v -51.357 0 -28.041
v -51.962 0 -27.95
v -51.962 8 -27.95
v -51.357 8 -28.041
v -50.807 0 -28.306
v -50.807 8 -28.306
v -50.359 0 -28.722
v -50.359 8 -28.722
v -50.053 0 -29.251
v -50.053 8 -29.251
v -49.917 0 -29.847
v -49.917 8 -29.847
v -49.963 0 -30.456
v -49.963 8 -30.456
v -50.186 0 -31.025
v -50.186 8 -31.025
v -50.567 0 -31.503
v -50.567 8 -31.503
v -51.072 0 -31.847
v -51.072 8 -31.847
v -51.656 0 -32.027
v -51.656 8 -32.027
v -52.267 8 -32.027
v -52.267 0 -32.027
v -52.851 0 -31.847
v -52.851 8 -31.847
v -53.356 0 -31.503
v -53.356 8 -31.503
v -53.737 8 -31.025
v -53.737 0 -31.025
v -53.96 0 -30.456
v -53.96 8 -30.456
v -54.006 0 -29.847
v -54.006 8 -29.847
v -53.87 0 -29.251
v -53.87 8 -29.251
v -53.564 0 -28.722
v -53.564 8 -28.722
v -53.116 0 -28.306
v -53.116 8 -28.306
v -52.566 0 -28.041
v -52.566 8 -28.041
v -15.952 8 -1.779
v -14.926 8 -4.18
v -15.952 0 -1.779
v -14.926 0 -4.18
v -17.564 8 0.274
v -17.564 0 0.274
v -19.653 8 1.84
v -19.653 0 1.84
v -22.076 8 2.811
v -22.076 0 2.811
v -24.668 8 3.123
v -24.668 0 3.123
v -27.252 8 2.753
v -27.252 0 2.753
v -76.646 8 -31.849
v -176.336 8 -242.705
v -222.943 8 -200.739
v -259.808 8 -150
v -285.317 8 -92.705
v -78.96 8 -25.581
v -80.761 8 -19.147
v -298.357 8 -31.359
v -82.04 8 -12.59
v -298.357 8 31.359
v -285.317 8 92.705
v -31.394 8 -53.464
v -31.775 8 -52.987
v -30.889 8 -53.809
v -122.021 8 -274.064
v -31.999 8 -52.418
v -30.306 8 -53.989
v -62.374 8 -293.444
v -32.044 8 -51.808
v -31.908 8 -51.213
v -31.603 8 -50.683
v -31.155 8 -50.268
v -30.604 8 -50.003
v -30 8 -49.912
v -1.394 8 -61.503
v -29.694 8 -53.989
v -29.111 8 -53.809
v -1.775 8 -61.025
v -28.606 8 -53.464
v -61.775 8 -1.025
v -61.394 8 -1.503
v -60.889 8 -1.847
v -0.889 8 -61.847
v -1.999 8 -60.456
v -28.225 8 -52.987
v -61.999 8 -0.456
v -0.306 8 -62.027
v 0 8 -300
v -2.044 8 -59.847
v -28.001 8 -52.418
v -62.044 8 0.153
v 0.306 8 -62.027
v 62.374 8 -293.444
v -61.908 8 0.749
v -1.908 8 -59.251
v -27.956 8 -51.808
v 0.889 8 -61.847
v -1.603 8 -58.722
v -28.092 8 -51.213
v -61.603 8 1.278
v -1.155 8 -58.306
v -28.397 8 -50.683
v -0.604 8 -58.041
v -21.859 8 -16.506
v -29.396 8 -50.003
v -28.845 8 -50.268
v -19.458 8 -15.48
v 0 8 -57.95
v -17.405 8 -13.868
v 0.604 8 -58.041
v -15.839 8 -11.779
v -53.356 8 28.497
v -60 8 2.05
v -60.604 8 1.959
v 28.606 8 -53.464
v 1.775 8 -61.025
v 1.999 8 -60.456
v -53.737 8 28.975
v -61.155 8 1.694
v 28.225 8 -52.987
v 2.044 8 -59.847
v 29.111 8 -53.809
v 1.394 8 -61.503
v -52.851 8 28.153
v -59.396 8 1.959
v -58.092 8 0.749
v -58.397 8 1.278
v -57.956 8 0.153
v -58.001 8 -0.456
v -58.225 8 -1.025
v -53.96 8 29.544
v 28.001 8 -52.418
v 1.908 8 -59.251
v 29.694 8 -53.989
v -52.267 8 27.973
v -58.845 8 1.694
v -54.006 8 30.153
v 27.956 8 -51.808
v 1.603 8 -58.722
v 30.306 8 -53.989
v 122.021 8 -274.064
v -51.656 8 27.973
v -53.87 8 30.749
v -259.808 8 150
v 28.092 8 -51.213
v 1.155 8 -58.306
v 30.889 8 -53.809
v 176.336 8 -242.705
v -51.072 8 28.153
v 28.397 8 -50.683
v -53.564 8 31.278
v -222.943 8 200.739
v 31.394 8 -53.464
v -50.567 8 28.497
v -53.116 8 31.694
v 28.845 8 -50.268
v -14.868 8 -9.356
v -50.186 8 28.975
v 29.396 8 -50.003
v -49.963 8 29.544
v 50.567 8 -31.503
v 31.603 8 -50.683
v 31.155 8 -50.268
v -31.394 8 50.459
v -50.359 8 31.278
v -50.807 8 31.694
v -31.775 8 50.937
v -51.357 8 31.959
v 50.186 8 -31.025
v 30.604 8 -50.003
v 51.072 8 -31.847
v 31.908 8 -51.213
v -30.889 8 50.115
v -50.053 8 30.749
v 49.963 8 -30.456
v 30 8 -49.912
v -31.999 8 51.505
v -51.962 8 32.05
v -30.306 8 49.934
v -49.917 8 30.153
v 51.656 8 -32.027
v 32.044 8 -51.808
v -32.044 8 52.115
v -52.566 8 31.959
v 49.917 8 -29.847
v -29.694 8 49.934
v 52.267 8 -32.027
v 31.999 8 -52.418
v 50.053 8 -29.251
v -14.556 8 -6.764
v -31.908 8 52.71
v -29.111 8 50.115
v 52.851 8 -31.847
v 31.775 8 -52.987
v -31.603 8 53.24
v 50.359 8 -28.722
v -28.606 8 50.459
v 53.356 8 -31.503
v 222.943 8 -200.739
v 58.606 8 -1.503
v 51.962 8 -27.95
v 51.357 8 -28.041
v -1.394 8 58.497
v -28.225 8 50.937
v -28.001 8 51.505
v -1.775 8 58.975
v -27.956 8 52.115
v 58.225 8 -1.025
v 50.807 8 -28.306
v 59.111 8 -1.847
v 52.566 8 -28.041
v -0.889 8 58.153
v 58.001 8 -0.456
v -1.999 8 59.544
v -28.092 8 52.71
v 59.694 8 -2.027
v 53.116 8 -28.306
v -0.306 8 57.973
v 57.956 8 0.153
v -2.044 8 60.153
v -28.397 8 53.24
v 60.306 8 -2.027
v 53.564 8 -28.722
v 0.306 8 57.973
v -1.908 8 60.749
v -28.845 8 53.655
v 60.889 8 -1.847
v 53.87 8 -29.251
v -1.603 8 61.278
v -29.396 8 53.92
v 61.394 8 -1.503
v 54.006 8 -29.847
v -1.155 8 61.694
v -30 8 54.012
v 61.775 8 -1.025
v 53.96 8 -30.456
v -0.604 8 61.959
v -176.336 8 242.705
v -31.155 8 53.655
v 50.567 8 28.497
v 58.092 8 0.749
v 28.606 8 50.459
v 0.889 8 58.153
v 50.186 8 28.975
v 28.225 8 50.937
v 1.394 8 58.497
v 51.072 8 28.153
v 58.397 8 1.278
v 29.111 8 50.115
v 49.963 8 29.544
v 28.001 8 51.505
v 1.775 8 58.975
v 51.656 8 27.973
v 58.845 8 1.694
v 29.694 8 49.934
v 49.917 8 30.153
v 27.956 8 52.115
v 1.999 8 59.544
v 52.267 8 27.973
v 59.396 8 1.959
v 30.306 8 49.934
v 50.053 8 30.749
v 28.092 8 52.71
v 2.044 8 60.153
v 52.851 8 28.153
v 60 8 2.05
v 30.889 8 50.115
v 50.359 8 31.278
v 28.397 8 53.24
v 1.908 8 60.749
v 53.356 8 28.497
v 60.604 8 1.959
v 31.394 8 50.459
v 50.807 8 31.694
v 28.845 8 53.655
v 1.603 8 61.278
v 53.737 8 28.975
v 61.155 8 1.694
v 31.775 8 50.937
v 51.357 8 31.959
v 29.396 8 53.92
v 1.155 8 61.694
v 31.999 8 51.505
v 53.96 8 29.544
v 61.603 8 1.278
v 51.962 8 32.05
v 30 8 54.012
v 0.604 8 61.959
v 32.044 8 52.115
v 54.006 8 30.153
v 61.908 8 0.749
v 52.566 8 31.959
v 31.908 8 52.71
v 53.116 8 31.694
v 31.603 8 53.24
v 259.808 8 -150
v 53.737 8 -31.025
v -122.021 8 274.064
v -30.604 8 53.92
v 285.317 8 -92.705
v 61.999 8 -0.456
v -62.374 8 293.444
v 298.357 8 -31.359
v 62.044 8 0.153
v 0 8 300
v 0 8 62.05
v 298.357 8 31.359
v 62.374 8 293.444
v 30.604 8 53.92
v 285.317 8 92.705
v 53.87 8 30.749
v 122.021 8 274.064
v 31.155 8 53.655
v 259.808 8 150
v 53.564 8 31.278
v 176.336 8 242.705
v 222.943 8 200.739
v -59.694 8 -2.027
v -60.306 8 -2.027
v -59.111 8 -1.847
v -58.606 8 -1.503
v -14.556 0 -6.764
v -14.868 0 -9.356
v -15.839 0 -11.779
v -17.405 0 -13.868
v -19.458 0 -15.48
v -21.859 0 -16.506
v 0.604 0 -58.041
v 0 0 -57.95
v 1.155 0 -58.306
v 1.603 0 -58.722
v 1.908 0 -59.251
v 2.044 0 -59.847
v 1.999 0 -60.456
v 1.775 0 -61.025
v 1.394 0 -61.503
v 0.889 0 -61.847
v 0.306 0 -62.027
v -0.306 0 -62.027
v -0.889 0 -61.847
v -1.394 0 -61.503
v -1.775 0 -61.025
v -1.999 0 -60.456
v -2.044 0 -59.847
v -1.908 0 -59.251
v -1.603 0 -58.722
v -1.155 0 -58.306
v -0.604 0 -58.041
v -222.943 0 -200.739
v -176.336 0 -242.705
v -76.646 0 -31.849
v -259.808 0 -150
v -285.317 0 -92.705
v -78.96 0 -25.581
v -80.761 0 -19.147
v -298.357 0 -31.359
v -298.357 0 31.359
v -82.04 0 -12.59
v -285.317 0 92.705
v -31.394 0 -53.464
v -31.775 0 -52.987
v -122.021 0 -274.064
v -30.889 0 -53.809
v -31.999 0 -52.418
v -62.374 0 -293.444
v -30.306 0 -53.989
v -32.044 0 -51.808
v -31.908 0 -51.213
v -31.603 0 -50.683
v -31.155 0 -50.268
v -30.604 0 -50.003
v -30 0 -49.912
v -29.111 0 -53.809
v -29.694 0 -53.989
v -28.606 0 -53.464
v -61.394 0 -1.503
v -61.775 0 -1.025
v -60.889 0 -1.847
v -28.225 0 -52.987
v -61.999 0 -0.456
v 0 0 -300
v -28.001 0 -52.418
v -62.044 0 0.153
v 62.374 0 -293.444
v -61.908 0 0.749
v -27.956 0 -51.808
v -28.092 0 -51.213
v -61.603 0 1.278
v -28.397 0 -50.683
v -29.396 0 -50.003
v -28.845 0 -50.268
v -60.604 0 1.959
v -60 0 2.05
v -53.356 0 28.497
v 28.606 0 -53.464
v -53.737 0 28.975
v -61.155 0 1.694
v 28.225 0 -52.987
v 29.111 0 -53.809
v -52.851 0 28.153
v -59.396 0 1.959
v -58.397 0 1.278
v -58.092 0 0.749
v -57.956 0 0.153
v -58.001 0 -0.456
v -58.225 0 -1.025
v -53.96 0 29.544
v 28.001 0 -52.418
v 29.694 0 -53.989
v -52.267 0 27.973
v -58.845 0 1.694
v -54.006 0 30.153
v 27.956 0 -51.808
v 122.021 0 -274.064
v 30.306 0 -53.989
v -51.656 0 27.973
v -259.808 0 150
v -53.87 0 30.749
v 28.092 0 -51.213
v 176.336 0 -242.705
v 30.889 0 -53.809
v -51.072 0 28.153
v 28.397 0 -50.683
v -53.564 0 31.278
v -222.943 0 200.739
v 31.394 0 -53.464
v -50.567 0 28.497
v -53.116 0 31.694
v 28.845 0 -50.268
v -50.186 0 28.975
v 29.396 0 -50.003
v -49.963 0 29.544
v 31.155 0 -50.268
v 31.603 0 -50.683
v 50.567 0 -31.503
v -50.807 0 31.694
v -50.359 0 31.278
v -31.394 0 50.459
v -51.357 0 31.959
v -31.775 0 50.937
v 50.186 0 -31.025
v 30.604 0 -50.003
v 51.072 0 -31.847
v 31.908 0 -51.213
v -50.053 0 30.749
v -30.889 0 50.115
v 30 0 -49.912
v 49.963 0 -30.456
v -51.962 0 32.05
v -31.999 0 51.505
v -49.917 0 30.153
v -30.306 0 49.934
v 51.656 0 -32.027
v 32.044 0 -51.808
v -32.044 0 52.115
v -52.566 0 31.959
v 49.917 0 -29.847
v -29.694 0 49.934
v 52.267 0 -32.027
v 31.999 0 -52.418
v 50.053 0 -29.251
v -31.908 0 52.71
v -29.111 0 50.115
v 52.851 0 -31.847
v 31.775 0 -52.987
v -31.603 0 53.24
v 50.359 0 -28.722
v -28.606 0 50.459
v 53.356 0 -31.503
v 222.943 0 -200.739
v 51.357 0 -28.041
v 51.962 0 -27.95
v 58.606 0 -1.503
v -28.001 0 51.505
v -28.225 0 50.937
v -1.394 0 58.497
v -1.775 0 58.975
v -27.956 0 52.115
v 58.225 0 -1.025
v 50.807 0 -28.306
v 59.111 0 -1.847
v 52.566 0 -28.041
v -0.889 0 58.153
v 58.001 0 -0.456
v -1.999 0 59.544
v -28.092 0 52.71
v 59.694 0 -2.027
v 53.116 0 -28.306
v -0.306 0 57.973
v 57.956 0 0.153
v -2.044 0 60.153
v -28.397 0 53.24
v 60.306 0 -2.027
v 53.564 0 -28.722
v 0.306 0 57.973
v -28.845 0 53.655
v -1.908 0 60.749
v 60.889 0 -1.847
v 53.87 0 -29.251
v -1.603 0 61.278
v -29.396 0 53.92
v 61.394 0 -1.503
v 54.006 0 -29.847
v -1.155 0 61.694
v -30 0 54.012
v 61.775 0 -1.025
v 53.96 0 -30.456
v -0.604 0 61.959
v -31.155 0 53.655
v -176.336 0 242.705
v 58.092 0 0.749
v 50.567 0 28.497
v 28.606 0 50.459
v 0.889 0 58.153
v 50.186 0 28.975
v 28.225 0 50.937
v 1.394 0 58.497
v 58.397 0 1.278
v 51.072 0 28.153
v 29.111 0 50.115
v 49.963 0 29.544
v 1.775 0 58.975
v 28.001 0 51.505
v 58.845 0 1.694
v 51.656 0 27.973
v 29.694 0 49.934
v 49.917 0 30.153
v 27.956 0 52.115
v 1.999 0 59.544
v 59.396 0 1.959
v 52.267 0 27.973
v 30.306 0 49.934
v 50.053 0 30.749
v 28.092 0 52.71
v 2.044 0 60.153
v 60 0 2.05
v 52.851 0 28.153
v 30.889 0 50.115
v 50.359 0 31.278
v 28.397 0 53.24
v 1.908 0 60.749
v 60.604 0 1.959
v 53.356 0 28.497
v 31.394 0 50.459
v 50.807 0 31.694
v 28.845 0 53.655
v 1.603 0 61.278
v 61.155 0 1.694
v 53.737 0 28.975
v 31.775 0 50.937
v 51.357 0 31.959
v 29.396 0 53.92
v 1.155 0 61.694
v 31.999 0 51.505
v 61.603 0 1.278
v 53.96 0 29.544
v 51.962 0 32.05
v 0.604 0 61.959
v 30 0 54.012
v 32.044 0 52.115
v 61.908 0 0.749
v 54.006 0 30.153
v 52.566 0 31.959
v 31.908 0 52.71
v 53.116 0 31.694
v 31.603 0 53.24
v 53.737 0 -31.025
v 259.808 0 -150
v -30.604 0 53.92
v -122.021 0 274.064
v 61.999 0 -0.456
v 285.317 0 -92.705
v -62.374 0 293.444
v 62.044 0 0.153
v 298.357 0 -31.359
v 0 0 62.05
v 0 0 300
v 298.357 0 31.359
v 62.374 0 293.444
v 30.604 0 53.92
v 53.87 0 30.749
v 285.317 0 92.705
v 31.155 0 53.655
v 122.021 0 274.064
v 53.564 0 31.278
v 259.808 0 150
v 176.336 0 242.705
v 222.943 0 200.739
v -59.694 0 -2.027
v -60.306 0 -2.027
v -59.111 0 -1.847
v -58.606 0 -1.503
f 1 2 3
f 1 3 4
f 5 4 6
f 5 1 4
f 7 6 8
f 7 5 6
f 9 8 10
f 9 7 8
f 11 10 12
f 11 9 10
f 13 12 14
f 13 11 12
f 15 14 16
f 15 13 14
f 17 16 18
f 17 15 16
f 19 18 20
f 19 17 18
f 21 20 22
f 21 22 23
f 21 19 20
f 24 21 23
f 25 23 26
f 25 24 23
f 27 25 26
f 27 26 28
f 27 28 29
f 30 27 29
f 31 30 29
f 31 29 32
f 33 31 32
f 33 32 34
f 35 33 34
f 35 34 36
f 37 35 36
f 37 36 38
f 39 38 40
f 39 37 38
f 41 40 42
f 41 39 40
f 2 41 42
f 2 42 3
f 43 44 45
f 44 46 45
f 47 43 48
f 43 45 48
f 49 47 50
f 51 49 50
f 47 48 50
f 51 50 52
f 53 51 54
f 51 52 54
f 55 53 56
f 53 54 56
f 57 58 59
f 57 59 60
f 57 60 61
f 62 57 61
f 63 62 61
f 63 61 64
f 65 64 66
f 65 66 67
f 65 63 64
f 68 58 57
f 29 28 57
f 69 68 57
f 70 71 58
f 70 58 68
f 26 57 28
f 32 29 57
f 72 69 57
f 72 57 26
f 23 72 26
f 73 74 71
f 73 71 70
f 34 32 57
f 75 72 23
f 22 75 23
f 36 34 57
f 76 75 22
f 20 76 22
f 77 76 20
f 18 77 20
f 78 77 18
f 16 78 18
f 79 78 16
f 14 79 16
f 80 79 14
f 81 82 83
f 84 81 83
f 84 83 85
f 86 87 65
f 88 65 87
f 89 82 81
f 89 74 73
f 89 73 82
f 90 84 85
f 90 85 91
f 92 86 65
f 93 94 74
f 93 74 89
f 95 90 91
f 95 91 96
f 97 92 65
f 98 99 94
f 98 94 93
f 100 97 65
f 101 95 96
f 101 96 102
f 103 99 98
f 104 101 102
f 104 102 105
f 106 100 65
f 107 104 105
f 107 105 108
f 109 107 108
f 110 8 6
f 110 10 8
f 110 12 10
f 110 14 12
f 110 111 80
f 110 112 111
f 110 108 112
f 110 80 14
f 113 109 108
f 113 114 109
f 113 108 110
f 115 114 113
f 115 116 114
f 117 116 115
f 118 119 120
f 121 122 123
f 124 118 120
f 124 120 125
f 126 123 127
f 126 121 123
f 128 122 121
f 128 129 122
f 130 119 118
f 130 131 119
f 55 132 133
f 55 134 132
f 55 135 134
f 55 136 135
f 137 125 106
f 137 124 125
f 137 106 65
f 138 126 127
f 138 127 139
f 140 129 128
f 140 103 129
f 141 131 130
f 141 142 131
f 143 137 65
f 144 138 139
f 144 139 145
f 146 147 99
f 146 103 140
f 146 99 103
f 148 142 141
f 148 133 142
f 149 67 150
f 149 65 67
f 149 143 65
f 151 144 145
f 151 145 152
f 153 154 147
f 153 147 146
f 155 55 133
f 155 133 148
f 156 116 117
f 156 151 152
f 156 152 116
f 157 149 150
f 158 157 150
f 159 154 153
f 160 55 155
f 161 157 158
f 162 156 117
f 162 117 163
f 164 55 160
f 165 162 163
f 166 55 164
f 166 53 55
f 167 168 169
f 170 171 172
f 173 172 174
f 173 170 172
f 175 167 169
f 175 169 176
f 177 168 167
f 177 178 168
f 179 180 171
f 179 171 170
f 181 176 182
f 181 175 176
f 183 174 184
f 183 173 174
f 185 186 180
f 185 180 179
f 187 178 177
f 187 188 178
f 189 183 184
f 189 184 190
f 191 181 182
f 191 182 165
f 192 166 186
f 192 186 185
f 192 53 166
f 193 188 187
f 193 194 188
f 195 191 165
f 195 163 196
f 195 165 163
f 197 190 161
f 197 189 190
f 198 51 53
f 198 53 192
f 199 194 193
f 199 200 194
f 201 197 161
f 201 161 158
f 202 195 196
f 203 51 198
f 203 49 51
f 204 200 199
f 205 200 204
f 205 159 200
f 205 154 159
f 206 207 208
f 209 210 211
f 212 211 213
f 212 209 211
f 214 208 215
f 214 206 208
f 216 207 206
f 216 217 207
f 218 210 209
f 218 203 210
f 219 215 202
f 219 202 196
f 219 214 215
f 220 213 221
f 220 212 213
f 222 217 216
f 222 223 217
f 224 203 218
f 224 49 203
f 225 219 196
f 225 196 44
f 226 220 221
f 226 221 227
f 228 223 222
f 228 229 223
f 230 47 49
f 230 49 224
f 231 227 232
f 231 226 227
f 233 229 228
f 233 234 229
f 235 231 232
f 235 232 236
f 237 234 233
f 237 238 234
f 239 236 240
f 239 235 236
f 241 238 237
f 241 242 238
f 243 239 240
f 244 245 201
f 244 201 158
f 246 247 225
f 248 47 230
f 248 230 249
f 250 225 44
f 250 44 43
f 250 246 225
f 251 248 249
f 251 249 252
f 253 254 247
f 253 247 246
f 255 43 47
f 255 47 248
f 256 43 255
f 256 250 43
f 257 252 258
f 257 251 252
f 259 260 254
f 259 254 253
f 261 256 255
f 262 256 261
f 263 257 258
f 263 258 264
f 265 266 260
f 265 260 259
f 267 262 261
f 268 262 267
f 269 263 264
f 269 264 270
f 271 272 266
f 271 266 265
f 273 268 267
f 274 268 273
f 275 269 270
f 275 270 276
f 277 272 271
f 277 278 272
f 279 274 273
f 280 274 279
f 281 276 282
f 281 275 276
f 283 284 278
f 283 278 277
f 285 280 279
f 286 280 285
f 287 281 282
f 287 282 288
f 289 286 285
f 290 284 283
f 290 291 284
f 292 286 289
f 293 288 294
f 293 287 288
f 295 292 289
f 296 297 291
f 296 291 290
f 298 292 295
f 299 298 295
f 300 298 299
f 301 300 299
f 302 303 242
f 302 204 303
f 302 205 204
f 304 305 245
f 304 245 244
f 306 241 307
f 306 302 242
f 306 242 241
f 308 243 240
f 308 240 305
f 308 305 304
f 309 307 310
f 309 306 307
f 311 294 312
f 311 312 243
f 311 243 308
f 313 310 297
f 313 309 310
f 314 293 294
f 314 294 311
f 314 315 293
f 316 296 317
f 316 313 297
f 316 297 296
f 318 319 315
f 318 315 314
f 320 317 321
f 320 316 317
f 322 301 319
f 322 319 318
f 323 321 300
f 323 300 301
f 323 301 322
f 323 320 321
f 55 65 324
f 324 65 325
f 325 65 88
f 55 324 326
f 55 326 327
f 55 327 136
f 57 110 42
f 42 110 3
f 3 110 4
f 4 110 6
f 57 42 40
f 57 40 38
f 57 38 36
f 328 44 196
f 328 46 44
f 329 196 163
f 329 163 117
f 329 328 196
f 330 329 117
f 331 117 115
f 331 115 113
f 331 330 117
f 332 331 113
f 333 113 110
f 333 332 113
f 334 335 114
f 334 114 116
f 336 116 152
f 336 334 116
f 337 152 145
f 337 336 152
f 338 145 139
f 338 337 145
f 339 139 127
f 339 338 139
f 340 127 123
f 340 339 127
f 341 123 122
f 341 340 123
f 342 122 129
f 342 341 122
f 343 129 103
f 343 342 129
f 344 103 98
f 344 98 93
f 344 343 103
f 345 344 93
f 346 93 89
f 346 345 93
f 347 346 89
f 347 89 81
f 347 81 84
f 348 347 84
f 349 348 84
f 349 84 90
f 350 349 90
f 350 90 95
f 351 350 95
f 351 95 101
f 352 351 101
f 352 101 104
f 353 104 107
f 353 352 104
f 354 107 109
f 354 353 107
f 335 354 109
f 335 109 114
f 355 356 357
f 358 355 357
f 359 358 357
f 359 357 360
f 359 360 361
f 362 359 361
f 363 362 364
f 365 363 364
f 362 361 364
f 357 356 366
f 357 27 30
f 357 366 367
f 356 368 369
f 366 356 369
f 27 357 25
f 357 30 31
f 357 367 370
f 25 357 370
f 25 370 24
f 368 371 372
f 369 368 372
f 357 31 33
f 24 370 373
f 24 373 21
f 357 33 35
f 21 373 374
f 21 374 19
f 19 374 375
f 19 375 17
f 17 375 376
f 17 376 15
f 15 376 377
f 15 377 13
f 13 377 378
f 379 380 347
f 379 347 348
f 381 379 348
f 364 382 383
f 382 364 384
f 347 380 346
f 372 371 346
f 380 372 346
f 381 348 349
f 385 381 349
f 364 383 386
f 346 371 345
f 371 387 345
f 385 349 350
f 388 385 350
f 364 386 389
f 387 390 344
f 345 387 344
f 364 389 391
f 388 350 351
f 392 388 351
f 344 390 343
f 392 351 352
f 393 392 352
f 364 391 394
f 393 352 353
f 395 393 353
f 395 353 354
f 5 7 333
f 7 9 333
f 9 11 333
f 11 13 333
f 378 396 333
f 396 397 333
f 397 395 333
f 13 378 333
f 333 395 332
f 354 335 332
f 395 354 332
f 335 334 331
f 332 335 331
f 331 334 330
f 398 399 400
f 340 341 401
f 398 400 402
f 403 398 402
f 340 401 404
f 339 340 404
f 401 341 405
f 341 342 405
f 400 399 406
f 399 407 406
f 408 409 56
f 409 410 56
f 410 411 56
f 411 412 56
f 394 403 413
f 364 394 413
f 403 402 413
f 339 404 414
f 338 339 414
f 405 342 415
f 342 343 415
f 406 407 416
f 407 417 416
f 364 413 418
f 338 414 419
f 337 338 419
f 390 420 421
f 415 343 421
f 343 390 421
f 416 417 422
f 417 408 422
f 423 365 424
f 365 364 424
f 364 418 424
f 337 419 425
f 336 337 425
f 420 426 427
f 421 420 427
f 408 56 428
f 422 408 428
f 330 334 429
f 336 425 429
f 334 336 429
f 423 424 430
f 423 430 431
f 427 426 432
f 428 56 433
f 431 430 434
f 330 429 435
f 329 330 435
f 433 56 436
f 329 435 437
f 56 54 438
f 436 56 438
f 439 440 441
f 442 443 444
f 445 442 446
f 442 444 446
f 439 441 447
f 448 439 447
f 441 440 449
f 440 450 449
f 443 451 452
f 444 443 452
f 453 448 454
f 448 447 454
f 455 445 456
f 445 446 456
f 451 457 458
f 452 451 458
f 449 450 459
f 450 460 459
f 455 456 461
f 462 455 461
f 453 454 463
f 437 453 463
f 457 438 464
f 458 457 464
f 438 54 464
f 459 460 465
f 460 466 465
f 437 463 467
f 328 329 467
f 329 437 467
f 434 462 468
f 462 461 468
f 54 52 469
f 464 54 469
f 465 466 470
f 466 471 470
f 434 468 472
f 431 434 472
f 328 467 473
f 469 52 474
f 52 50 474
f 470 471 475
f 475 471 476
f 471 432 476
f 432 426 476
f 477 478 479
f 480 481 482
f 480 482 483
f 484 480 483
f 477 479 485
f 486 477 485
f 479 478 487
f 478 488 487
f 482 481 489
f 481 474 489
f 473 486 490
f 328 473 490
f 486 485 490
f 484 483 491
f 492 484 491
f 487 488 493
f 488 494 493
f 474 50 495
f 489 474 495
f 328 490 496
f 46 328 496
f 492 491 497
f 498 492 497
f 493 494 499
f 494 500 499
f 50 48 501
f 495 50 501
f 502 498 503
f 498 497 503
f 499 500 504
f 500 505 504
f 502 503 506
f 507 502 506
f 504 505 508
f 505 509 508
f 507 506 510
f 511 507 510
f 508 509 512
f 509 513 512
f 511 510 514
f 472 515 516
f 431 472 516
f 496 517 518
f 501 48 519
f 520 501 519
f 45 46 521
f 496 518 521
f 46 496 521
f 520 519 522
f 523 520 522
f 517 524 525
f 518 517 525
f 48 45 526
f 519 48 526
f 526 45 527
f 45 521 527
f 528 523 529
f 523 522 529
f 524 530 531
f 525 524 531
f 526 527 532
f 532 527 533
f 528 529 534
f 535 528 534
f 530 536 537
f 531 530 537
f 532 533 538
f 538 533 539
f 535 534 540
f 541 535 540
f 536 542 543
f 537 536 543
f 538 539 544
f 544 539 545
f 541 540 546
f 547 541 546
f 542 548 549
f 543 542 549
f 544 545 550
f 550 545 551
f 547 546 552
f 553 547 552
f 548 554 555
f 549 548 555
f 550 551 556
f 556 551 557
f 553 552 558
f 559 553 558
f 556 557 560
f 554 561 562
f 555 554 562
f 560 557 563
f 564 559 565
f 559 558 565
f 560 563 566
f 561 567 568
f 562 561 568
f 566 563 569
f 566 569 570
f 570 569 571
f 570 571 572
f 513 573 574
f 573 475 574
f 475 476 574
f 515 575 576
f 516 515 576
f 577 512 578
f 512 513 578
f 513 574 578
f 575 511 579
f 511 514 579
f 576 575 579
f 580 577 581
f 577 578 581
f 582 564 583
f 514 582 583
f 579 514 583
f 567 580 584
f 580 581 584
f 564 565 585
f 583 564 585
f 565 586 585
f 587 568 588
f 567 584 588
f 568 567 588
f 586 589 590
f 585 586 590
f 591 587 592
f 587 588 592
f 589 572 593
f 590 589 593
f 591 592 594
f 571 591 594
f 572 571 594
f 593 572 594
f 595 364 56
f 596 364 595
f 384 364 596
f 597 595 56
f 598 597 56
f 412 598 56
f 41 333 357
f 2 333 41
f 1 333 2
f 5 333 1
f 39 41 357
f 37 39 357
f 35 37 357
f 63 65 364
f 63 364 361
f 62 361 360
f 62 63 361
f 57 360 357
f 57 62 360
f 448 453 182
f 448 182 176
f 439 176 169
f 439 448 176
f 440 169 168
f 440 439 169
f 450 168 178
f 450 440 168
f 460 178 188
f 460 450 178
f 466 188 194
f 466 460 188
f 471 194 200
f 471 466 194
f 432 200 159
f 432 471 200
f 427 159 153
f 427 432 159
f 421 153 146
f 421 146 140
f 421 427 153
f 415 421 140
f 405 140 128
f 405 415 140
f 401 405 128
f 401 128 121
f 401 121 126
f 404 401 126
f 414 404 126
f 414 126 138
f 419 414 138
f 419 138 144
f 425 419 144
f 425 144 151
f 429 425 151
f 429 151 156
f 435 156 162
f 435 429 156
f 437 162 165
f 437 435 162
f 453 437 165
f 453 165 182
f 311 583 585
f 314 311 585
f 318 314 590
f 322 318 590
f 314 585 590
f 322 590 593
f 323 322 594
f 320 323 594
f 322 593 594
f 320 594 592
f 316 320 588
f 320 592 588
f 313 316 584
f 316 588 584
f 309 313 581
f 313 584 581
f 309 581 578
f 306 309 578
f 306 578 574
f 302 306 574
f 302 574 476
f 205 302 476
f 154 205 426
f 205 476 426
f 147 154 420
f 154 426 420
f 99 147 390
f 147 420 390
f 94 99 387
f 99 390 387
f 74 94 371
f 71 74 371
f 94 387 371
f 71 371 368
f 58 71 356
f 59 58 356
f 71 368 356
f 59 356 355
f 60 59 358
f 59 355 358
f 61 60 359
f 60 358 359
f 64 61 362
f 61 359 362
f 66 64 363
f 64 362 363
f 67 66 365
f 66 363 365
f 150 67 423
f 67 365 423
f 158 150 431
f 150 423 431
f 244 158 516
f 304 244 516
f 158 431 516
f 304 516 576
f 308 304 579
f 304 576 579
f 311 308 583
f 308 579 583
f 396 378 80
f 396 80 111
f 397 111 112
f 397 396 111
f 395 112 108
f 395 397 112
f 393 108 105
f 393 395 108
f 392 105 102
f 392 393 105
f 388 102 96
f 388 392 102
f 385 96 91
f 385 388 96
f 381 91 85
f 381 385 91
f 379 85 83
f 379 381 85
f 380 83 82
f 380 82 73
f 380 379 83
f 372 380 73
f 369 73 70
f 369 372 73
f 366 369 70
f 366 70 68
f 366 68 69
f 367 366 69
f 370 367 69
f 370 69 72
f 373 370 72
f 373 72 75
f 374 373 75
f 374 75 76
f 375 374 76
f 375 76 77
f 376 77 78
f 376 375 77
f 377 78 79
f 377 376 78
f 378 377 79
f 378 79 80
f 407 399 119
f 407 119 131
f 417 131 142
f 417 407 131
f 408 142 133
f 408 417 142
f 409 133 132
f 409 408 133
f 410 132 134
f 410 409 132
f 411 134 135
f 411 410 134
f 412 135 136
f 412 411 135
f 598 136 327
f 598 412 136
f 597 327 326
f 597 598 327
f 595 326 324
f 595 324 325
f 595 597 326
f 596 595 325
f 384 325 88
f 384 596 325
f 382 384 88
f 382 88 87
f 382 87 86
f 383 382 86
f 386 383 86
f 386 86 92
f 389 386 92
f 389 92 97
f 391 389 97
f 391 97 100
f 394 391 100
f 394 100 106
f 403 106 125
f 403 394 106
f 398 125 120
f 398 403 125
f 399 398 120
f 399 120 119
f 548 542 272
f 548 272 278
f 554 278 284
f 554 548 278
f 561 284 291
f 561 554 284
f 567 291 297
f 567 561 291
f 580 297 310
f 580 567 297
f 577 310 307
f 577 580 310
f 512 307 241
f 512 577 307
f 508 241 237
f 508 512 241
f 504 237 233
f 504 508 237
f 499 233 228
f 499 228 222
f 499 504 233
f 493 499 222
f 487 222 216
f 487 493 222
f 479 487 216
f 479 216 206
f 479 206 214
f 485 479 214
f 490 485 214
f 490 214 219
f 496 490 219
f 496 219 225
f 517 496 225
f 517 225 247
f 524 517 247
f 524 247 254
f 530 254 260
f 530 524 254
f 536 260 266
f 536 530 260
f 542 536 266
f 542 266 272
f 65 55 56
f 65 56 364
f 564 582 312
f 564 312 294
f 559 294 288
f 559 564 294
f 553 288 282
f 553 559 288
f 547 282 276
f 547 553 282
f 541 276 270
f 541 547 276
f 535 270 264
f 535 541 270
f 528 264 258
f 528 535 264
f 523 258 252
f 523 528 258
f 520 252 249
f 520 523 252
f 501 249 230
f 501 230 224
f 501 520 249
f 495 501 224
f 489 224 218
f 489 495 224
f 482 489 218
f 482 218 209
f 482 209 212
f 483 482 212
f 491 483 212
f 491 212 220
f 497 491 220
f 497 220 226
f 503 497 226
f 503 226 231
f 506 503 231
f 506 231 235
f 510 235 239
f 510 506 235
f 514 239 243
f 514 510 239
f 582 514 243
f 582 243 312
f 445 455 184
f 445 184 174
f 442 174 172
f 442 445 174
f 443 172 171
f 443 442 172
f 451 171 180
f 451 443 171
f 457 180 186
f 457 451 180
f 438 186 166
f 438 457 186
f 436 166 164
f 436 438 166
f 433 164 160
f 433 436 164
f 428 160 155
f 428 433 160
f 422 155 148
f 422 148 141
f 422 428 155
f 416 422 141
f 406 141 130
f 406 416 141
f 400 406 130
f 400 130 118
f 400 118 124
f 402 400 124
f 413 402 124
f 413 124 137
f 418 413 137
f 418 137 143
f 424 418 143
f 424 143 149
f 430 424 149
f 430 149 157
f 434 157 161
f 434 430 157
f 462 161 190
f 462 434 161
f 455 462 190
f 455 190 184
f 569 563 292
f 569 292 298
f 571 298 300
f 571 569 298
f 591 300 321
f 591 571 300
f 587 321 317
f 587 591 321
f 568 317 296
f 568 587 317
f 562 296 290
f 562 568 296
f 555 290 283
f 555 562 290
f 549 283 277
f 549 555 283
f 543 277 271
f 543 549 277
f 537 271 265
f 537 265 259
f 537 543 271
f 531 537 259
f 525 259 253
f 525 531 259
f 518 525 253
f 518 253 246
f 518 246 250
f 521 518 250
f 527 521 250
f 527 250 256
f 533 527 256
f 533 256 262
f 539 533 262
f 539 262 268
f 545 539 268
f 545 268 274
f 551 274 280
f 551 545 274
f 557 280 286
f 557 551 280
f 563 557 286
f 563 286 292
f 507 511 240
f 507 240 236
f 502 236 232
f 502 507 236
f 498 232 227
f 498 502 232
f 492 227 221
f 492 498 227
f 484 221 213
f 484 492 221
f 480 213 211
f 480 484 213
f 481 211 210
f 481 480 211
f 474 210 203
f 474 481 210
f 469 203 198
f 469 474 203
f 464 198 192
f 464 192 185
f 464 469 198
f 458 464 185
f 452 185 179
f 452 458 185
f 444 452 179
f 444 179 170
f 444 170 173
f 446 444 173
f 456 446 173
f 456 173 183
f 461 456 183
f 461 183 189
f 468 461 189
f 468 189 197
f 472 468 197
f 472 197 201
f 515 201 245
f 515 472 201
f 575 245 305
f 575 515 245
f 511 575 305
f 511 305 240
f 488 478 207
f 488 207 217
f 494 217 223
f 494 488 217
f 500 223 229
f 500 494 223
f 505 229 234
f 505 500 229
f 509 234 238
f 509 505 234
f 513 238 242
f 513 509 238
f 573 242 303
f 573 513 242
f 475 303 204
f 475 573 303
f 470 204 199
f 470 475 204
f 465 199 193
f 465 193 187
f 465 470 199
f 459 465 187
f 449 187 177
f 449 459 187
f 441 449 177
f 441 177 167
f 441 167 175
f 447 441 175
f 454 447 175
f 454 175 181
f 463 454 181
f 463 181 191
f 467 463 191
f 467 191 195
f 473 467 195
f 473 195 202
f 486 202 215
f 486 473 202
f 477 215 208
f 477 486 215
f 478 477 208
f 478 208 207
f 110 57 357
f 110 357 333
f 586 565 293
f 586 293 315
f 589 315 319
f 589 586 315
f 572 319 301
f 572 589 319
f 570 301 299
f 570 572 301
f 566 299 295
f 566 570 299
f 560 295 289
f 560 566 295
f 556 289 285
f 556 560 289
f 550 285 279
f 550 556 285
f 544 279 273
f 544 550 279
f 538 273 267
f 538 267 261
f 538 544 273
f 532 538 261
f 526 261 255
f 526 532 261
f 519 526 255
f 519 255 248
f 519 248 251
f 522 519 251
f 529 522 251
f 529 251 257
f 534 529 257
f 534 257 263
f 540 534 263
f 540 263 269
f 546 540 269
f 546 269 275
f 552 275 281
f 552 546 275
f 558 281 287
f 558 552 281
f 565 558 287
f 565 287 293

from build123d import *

# Parameters (mm, degrees)
SKETCH1_R           = 300
SKETCH1_R_2         = 2.05
BOSS_EXTRUDE1_DEPTH = 8
CUT_EXTRUDE1_DEPTH  = 425.339486732
FILLET1_R           = 10


with BuildPart() as part:
    # Sketch1 → Boss-Extrude1 (new body)
    with BuildSketch(Plane(origin=(0, 0, 0), x_dir=(1, 0, 0), z_dir=(0, 1, 0))):
        with Locations(Location((0, 0, 0), (0, 0, 270))):
            Circle(SKETCH1_R)
        with Locations(Location((0, 60, 0), (0, 0, 270))):
            Circle(SKETCH1_R_2, mode=Mode.SUBTRACT)
        with Locations(Location((30, 51.961524227, 0), (0, 0, 270))):
            Circle(SKETCH1_R_2, mode=Mode.SUBTRACT)
        with Locations(Location((51.961524227, 30, 0), (0, 0, 270))):
            Circle(SKETCH1_R_2, mode=Mode.SUBTRACT)
        with Locations(Location((60, 0, 0), (0, 0, 270))):
            Circle(SKETCH1_R_2, mode=Mode.SUBTRACT)
        with Locations(Location((51.961524227, -30, 0), (0, 0, 270))):
            Circle(SKETCH1_R_2, mode=Mode.SUBTRACT)
        with Locations(Location((30, -51.961524227, 0), (0, 0, 270))):
            Circle(SKETCH1_R_2, mode=Mode.SUBTRACT)
        with Locations(Location((0, -60, 0), (0, 0, 270))):
            Circle(SKETCH1_R_2, mode=Mode.SUBTRACT)
        with Locations(Location((-30, -51.961524227, 0), (0, 0, 270))):
            Circle(SKETCH1_R_2, mode=Mode.SUBTRACT)
        with Locations(Location((-51.961524227, -30, 0), (0, 0, 270))):
            Circle(SKETCH1_R_2, mode=Mode.SUBTRACT)
        with Locations(Location((-60, 0, 0), (0, 0, 270))):
            Circle(SKETCH1_R_2, mode=Mode.SUBTRACT)
        with Locations(Location((-51.961524227, 30, 0), (0, 0, 270))):
            Circle(SKETCH1_R_2, mode=Mode.SUBTRACT)
        with Locations(Location((-30, 51.961524227, 0), (0, 0, 270))):
            Circle(SKETCH1_R_2, mode=Mode.SUBTRACT)
    extrude(amount=BOSS_EXTRUDE1_DEPTH)

    # Sketch2 → Cut-Extrude1 (cut, through all)
    with BuildSketch(Plane(origin=(0, 8, 0), x_dir=(1, 0, 0), z_dir=(0, 1, 0))):
        with BuildLine():
            Line((-17.622435747, -5.449748467), (-82.039644988, 12.589545274))
            ThreePointArc((-82.039644988, 12.589545274), (-79.925216211, 22.38213157), (-76.646360273, 31.848633518))
            Line((-76.646360273, 31.848633518), (-12.229151031, 13.809339776))
            Line((-12.229151031, 13.809339776), (-17.622435747, -5.449748467))
        make_face()
    extrude(amount=-CUT_EXTRUDE1_DEPTH, mode=Mode.SUBTRACT)

    # Fillet1
    fillet1_edges = [part.edges().sort_by_distance(p)[0] for p in [
        (-17.622435747, 4, 5.449748467),
        (-12.229151031, 4, -13.809339776),
    ]]
    fillet(fillet1_edges, radius=FILLET1_R - 0.0001)  # a hair under: the kernel refuses the full size


solid = part.part
